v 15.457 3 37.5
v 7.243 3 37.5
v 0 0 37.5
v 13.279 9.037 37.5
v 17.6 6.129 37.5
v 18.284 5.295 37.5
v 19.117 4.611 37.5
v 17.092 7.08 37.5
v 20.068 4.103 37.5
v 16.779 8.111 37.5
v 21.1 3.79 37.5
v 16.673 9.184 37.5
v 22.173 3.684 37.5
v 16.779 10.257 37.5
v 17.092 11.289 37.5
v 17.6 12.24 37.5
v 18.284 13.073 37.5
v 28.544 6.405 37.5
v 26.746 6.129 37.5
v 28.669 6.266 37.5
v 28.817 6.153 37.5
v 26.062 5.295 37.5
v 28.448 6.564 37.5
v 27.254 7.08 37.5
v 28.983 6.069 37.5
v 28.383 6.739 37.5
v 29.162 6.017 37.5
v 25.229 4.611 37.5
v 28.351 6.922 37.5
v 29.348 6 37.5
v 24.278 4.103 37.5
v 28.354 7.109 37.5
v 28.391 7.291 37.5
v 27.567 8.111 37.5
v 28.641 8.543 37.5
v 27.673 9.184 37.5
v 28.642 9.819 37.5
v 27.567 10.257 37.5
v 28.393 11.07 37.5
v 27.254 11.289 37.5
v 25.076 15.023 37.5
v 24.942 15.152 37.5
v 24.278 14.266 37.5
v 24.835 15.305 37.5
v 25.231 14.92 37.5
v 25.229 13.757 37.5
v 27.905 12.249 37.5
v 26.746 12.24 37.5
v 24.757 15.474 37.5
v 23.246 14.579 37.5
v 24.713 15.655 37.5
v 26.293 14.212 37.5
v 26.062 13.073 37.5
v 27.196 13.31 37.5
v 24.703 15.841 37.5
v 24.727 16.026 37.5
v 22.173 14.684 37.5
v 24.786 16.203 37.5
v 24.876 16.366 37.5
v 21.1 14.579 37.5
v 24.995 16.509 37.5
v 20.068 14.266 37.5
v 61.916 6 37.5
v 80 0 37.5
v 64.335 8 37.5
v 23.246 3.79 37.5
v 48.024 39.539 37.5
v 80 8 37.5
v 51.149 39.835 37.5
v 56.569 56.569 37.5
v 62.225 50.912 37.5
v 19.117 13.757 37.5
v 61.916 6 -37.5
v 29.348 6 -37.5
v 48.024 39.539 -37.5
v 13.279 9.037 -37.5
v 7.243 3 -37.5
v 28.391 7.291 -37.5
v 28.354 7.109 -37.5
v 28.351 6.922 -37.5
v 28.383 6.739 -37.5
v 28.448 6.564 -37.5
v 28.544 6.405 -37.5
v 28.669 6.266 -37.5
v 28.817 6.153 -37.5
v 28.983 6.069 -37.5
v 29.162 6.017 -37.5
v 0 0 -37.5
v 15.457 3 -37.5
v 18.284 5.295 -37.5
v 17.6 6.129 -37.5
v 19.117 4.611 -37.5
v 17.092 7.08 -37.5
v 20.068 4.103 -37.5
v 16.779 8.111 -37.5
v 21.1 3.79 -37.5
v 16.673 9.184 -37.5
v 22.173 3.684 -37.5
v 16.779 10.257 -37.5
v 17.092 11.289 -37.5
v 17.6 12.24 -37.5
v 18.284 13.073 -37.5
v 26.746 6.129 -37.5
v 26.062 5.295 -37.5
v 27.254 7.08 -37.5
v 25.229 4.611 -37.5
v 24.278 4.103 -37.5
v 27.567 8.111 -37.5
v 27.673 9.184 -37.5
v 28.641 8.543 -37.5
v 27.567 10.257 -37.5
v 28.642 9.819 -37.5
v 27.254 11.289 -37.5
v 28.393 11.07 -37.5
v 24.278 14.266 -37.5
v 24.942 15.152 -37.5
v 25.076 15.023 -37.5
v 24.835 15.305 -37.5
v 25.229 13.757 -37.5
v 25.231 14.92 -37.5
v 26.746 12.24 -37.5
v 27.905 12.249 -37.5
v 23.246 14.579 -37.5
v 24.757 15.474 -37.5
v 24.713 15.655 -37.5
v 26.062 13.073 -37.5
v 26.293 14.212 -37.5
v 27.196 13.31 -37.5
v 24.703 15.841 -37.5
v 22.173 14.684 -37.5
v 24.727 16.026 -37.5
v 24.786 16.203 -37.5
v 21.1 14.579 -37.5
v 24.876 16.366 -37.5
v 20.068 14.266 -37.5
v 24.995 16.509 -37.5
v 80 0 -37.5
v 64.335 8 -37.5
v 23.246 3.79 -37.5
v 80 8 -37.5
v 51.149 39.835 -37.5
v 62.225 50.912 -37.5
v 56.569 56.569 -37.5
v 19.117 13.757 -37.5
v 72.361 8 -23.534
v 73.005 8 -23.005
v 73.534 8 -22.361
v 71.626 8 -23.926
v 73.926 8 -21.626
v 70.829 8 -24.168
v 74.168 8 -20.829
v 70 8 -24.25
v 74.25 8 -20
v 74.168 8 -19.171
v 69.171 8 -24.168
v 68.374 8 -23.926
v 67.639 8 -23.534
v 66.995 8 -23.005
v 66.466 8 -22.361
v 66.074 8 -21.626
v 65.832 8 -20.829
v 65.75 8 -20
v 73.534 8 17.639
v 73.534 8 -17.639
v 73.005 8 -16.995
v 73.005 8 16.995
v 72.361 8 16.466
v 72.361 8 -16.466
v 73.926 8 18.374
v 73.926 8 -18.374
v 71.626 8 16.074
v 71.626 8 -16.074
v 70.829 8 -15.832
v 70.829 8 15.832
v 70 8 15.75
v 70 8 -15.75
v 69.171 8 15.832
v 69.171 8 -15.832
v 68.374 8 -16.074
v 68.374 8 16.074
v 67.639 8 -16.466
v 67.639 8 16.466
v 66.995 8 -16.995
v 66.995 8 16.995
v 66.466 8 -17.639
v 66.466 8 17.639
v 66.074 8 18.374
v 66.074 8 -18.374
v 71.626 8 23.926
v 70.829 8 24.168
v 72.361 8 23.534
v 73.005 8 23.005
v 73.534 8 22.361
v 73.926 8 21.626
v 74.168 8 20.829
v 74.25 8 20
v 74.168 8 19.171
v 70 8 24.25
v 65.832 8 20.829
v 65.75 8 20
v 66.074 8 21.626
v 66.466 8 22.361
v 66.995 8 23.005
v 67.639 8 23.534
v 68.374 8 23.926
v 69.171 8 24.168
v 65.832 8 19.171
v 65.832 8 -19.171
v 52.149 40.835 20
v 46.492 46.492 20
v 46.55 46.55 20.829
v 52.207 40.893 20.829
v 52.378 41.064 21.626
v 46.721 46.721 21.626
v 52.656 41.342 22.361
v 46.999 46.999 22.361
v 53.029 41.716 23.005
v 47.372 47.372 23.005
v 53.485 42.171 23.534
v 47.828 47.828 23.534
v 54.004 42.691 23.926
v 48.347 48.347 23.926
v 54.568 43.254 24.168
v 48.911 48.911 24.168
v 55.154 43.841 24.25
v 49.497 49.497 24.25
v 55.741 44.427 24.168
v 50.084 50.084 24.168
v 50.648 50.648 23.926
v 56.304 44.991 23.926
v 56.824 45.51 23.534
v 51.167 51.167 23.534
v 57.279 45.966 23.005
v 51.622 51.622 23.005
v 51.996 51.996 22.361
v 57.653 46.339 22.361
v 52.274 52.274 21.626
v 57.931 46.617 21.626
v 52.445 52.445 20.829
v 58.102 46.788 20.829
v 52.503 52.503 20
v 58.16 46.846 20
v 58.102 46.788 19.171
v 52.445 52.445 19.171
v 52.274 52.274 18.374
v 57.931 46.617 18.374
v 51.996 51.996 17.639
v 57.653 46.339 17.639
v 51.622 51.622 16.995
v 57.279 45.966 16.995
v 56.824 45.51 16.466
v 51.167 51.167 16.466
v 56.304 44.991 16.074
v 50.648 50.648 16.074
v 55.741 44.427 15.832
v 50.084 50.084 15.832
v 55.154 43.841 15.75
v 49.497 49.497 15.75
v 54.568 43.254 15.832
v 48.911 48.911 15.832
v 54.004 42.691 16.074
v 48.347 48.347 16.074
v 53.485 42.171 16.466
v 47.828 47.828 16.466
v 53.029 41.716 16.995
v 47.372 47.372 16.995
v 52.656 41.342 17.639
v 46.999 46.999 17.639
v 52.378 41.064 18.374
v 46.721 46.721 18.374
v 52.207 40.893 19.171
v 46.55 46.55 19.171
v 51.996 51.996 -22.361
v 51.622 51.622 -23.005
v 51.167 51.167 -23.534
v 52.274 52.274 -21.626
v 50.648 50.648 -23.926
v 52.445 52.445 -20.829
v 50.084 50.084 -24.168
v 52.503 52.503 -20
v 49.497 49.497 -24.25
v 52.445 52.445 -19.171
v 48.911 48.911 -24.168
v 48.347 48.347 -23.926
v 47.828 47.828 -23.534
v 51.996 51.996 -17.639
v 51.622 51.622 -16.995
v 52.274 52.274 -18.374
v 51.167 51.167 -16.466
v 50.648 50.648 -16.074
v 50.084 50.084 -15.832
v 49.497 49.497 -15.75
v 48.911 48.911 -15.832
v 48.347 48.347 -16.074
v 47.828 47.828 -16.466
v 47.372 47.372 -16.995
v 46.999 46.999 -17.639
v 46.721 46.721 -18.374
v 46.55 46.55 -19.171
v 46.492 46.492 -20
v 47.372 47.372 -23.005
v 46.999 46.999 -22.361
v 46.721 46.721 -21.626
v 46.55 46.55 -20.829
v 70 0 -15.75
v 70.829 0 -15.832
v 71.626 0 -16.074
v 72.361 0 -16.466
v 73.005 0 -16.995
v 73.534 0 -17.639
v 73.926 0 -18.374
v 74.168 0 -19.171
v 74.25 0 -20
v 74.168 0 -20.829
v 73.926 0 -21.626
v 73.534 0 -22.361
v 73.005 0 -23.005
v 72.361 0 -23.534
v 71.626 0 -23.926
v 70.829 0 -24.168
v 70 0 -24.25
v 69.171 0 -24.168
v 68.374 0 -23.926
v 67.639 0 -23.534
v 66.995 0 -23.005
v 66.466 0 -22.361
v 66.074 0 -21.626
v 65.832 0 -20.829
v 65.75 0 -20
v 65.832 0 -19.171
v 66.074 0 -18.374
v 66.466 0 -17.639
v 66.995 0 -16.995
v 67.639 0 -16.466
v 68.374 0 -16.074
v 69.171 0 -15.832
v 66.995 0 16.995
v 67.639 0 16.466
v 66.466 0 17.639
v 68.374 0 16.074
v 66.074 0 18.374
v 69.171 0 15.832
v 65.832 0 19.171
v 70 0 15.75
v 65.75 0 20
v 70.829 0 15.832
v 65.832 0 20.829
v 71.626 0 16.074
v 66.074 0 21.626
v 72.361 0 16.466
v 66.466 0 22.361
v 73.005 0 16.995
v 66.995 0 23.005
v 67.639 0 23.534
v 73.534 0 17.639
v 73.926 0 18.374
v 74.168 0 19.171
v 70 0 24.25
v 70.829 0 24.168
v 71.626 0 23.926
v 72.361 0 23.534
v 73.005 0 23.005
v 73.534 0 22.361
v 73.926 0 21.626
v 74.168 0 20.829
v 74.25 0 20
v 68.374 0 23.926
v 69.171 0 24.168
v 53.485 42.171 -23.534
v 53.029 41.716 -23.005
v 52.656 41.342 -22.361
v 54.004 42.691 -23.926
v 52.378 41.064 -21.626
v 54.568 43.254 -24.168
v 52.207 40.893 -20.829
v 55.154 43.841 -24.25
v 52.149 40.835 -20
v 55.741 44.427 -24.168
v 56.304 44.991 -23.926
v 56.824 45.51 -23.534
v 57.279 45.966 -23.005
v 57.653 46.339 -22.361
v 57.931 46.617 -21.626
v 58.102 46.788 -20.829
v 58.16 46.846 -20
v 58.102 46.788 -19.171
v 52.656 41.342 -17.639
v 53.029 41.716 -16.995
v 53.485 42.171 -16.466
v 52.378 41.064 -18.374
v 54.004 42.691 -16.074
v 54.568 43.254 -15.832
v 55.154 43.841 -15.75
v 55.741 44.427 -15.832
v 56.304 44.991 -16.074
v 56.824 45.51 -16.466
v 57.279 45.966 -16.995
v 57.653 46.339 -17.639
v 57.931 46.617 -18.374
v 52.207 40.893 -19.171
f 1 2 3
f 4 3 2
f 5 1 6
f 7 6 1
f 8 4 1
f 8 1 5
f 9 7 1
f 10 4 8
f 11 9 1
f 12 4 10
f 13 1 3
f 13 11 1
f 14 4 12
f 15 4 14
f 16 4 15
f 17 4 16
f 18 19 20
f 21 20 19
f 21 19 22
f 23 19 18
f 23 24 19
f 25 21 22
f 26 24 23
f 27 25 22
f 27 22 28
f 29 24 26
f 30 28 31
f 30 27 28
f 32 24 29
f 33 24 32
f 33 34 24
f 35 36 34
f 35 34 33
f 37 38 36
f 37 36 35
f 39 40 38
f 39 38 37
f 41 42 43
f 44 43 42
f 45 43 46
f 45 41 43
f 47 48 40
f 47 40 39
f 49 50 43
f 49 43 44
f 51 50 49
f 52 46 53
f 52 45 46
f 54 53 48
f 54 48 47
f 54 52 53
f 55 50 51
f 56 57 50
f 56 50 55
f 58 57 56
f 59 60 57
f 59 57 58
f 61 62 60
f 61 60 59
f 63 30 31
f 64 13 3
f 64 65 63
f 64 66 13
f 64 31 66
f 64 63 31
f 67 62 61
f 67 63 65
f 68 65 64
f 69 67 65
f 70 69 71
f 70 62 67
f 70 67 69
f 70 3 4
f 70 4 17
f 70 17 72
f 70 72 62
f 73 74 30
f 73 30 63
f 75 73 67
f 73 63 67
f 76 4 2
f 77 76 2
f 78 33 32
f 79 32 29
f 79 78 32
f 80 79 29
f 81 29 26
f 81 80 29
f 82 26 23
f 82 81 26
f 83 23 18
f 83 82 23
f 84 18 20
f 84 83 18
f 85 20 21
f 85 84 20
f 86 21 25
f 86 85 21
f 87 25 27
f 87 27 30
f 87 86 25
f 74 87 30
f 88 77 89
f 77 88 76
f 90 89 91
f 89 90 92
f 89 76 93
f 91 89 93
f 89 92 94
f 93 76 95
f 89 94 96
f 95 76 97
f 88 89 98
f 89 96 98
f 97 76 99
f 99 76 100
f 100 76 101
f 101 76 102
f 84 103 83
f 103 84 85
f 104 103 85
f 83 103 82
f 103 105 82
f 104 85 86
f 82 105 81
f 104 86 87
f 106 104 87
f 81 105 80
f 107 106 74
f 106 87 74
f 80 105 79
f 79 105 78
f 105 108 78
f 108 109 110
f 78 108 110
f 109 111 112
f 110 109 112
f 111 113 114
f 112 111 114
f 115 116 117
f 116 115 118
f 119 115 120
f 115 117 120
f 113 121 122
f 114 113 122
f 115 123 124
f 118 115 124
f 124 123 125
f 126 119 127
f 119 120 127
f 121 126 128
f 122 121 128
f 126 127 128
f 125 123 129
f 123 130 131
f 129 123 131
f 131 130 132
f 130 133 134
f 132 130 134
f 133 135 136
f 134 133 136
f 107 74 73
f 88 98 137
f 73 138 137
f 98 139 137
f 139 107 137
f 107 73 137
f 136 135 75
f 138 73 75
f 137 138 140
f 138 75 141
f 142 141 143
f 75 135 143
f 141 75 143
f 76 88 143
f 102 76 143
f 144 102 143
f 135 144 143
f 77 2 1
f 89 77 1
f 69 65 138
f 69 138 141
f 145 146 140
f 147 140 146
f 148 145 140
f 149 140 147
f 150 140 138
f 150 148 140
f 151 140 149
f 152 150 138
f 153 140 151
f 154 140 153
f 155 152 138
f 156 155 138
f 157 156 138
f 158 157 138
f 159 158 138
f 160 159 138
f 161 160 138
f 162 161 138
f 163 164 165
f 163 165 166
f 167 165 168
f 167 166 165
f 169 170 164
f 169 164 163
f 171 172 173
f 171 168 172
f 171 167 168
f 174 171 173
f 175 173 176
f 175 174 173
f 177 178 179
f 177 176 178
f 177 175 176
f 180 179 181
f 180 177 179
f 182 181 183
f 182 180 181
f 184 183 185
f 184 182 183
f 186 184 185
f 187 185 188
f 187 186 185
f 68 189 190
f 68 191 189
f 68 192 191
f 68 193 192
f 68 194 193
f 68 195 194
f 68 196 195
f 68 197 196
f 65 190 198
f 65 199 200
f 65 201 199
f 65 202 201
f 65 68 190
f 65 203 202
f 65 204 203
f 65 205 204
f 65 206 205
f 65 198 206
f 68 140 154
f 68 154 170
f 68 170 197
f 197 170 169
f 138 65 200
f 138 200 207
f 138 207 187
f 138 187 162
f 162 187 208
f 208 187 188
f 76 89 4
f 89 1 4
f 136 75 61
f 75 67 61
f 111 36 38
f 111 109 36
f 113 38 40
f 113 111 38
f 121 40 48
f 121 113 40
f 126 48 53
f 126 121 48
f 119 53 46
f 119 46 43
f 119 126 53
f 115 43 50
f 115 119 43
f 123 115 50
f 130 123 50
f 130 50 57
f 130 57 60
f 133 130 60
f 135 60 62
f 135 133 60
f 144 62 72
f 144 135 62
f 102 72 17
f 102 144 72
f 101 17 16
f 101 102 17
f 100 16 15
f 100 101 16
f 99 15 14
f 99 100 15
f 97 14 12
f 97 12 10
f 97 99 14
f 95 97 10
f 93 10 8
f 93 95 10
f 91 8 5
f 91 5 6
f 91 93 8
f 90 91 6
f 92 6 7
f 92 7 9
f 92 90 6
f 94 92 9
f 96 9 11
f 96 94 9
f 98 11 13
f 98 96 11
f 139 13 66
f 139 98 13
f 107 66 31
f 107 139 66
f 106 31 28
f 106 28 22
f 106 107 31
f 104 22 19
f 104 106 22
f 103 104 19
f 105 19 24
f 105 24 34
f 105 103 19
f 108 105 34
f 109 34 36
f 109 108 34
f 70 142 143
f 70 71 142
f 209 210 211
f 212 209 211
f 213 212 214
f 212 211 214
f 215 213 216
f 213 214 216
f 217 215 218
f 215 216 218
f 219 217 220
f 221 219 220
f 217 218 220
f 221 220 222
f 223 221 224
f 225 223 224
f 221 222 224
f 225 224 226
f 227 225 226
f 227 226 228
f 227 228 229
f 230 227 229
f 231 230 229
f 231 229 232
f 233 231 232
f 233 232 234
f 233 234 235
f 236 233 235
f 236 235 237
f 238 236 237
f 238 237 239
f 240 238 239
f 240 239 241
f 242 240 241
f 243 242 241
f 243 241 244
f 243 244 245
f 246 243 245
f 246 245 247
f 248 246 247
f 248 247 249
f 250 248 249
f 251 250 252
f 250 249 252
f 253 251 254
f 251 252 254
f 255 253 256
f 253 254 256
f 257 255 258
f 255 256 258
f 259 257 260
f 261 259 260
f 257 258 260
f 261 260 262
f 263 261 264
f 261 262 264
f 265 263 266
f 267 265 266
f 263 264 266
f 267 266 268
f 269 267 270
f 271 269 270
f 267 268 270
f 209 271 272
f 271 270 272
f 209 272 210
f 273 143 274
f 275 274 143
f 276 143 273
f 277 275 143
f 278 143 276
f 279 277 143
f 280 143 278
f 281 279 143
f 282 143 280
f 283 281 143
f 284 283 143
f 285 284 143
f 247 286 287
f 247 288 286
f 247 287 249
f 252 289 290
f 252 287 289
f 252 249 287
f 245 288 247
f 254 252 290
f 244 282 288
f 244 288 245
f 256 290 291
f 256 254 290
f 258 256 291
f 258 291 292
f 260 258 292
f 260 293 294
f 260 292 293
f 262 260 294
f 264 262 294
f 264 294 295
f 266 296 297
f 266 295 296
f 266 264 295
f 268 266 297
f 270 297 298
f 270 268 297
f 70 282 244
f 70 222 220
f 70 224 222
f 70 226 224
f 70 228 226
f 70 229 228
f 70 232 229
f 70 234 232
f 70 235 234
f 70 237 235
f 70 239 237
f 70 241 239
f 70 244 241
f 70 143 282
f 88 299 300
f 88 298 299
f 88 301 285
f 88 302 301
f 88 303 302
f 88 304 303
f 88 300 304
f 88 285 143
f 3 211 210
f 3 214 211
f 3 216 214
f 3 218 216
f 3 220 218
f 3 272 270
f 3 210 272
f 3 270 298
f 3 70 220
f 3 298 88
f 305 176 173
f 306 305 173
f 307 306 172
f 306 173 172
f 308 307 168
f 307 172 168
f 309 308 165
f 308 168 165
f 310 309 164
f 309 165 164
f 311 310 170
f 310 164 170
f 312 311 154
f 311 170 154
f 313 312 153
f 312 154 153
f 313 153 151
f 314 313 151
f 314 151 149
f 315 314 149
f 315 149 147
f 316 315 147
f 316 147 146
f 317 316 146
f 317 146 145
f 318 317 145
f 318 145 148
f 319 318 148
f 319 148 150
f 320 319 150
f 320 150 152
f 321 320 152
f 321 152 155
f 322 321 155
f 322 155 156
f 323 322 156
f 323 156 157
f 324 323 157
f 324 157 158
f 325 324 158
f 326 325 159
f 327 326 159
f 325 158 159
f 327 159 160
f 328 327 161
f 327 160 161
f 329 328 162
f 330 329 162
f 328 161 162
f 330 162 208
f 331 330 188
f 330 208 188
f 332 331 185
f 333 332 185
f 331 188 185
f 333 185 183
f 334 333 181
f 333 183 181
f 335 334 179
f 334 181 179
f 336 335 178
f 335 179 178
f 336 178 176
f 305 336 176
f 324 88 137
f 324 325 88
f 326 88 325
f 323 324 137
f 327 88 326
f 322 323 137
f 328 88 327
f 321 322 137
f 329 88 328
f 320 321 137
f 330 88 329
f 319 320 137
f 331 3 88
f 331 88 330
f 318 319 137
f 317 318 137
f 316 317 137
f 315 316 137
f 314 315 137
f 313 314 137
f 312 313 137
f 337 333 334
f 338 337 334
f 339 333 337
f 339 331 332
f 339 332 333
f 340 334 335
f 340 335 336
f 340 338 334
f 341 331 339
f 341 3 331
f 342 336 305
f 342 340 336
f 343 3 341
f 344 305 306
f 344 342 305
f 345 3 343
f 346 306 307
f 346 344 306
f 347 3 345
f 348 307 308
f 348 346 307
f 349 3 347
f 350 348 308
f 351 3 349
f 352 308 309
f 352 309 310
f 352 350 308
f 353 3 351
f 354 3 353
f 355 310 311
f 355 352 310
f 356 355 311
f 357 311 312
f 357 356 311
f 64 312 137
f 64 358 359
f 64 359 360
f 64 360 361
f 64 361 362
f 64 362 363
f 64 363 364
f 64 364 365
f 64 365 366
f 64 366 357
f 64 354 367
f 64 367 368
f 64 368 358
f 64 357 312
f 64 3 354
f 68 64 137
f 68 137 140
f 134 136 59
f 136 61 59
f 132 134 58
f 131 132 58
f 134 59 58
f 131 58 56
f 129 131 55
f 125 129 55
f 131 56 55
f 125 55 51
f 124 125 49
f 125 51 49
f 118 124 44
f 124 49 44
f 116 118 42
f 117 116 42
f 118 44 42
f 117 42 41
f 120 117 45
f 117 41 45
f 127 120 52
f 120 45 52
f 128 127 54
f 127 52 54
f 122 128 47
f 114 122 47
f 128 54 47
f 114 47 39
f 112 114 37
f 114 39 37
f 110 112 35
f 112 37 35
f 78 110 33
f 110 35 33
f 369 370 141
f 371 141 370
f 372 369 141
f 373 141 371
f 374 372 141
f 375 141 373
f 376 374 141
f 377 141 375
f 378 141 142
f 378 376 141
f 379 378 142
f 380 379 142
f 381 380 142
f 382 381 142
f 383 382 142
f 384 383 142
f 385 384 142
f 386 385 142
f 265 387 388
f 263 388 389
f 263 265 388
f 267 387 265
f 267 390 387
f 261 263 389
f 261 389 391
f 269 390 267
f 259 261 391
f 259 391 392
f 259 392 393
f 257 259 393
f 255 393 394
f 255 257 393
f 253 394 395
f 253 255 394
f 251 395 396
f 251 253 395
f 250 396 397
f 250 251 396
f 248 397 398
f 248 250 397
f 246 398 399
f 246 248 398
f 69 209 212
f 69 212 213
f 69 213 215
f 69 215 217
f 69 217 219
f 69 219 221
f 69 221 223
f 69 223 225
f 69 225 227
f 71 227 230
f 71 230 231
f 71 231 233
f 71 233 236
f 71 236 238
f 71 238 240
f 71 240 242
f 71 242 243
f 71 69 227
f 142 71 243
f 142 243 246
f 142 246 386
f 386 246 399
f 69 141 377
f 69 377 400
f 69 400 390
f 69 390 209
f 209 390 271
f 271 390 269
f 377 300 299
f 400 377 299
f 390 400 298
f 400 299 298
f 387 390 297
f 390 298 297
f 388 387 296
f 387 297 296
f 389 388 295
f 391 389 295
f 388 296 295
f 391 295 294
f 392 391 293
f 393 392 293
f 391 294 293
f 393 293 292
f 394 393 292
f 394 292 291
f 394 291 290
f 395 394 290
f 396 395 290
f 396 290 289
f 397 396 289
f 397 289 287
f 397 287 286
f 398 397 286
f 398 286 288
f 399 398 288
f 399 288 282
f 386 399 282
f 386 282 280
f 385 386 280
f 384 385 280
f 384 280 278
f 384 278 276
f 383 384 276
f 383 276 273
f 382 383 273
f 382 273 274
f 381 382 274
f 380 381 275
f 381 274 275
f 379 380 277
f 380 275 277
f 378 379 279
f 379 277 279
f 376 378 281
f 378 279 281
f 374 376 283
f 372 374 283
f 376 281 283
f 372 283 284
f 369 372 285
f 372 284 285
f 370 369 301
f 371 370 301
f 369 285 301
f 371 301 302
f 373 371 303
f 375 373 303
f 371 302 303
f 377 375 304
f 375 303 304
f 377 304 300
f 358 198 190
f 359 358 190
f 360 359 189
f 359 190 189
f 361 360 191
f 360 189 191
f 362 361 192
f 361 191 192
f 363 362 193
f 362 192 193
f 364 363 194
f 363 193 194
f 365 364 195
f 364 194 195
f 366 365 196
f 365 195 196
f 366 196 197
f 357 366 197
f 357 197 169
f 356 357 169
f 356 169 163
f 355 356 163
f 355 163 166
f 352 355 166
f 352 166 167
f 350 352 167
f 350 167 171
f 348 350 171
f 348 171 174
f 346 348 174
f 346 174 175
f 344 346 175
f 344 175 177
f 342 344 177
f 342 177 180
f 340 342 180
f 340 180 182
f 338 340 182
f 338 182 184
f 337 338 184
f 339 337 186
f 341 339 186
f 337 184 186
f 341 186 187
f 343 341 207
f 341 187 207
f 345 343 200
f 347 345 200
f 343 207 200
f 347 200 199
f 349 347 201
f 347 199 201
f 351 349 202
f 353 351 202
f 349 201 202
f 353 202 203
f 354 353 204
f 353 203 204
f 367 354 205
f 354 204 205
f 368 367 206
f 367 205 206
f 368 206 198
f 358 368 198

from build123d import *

# Parameters (mm, degrees)
SKETCH_1_R          = 5.5
EXTRUDE_1_DEPTH     = 37.5
SKETCH_2_R          = 4.25
CUT_EXTRUDE_1_DEPTH = 13
SKETCH_3_R          = 4.25
CUT_EXTRUDE_2_DEPTH = 101.822385015


with BuildPart() as part:
    # 草图1 → 凸台-拉伸1 (new, symmetric)
    with BuildSketch(Plane.XY):
        Polygon((0, 0), (80, 0), (80, 8), (64.335195596, 8), (51.148707324, 39.834998826), (62.225396744, 50.911688245), (56.568542495, 56.568542495), align=None)
        with Locations((22.17310878, 9.184402377)):
            Circle(SKETCH_1_R, mode=Mode.SUBTRACT)
        Polygon((7.242640687, 3), (15.457113006, 3), (13.279414953, 9.036774265), align=None, mode=Mode.SUBTRACT)
        with BuildLine():
            Line((29.347952769, 6), (61.91644612, 6))
            Line((61.91644612, 6), (48.024179606, 39.538898231))
            Line((48.024179606, 39.538898231), (24.994777104, 16.509495729))
            ThreePointArc((24.994777104, 16.509495729), (24.712781801, 15.655157608), (25.231380538, 14.919990739))
            ThreePointArc((25.231380538, 14.919990739), (28.178325742, 11.671844687), (28.391306903, 7.29125365))
            ThreePointArc((28.391306903, 7.29125365), (28.544443699, 6.404707488), (29.347952769, 6))
        make_face(mode=Mode.SUBTRACT)
    extrude(amount=EXTRUDE_1_DEPTH, both=True)

    # 草图2 → 切除-拉伸1 (cut)
    with BuildSketch(Plane(origin=(0, 0, 0), x_dir=(0, 0, 1), z_dir=(-0.7071067811865477, 0.7071067811865475, 0))):
        with Locations(Location((20, 70, 0), (0, 0, 270))):
            Circle(SKETCH_2_R)
        with Locations(Location((-20, 70, 0), (0, 0, 270))):
            Circle(SKETCH_2_R)
    extrude(amount=-CUT_EXTRUDE_1_DEPTH, mode=Mode.SUBTRACT)

    # 草图3 → 切除-拉伸2 (cut, through all)
    with BuildSketch(Plane(origin=(0, 8, 0), x_dir=(1, 0, 0), z_dir=(0, 1, 0))):
        with Locations(Location((70, -20, 0), (0, 0, 270))):
            Circle(SKETCH_3_R)
        with Locations(Location((70, 20, 0), (0, 0, 270))):
            Circle(SKETCH_3_R)
    extrude(amount=-CUT_EXTRUDE_2_DEPTH, mode=Mode.SUBTRACT)


solid = part.part
